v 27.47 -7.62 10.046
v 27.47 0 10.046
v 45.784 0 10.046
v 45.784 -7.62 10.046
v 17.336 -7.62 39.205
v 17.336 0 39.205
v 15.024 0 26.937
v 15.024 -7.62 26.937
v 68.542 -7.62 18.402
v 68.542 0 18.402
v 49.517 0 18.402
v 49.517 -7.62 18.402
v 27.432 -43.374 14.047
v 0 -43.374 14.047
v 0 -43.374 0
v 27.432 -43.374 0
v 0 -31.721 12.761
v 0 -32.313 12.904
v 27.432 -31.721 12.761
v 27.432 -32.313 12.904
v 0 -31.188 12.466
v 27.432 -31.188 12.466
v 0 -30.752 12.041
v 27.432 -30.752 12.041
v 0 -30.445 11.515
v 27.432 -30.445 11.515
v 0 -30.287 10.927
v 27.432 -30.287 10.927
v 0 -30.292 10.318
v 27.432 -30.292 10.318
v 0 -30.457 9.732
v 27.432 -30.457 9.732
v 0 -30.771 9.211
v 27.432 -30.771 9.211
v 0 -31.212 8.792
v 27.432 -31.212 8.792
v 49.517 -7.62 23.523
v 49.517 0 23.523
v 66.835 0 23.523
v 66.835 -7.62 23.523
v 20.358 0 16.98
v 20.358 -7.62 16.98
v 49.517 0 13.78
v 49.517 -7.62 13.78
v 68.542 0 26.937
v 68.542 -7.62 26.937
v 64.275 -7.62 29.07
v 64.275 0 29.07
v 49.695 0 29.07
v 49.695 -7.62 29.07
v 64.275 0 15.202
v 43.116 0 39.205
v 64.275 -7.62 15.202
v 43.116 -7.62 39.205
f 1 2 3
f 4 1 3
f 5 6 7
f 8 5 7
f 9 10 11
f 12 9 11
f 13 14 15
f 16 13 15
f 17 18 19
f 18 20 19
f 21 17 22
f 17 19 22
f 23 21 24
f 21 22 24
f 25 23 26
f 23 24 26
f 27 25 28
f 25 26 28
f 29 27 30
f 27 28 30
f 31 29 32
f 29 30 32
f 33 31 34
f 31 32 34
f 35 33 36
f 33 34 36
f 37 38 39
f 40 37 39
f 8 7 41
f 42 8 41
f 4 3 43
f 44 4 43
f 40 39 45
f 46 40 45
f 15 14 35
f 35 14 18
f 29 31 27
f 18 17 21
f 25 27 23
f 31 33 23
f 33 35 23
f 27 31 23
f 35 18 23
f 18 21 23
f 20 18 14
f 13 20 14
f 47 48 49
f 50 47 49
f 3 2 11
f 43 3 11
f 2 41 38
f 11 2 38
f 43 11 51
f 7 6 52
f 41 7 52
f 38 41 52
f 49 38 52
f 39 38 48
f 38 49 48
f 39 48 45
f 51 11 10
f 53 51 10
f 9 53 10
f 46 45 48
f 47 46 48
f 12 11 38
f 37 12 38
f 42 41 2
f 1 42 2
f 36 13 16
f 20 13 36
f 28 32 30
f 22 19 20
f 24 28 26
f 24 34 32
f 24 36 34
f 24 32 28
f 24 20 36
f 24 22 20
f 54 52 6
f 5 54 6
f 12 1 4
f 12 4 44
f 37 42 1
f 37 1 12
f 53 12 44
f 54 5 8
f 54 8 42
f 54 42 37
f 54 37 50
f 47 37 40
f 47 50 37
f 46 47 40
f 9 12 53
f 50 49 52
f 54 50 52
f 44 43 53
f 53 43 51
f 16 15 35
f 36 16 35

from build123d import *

# Parameters (mm, degrees)
F1_DEPTH = 7.62
F3_DEPTH = 27.432
F4_R     = 2.277872


with BuildPart() as f1:
    # F0 (on Front) → F1 (new body)
    with BuildSketch(Plane.XZ):
        Polygon((43.116499, 39.204903), (17.335501, 39.204903), (15.0241, 26.936701), (20.358101, 16.979899), (27.470101, 10.045701), (45.783501, 10.045701), (49.5173, 13.7795), (64.274698, 15.2019), (68.541899, 18.402301), (49.5173, 18.402301), (49.5173, 23.52294), (66.835019, 23.52294), (68.541899, 26.936701), (64.274698, 29.070301), (49.695101, 29.070301), align=None)
    extrude(amount=F1_DEPTH)


with BuildPart() as f3:
    # F2 (on Right) → F3 (new body)
    with BuildSketch(Plane.YZ):
        Polygon((-26.373954, 12.28949), (-43.373745, 14.047142), (-43.373745, 0), align=None)
    extrude(amount=F3_DEPTH)

    # F4
    f4_edges = [f3.edges().sort_by_distance(p)[0] for p in [
        (13.716, -26.373954, 12.28949),
    ]]
    fillet(f4_edges, radius=F4_R)


solid = Compound([f1.part, f3.part])
